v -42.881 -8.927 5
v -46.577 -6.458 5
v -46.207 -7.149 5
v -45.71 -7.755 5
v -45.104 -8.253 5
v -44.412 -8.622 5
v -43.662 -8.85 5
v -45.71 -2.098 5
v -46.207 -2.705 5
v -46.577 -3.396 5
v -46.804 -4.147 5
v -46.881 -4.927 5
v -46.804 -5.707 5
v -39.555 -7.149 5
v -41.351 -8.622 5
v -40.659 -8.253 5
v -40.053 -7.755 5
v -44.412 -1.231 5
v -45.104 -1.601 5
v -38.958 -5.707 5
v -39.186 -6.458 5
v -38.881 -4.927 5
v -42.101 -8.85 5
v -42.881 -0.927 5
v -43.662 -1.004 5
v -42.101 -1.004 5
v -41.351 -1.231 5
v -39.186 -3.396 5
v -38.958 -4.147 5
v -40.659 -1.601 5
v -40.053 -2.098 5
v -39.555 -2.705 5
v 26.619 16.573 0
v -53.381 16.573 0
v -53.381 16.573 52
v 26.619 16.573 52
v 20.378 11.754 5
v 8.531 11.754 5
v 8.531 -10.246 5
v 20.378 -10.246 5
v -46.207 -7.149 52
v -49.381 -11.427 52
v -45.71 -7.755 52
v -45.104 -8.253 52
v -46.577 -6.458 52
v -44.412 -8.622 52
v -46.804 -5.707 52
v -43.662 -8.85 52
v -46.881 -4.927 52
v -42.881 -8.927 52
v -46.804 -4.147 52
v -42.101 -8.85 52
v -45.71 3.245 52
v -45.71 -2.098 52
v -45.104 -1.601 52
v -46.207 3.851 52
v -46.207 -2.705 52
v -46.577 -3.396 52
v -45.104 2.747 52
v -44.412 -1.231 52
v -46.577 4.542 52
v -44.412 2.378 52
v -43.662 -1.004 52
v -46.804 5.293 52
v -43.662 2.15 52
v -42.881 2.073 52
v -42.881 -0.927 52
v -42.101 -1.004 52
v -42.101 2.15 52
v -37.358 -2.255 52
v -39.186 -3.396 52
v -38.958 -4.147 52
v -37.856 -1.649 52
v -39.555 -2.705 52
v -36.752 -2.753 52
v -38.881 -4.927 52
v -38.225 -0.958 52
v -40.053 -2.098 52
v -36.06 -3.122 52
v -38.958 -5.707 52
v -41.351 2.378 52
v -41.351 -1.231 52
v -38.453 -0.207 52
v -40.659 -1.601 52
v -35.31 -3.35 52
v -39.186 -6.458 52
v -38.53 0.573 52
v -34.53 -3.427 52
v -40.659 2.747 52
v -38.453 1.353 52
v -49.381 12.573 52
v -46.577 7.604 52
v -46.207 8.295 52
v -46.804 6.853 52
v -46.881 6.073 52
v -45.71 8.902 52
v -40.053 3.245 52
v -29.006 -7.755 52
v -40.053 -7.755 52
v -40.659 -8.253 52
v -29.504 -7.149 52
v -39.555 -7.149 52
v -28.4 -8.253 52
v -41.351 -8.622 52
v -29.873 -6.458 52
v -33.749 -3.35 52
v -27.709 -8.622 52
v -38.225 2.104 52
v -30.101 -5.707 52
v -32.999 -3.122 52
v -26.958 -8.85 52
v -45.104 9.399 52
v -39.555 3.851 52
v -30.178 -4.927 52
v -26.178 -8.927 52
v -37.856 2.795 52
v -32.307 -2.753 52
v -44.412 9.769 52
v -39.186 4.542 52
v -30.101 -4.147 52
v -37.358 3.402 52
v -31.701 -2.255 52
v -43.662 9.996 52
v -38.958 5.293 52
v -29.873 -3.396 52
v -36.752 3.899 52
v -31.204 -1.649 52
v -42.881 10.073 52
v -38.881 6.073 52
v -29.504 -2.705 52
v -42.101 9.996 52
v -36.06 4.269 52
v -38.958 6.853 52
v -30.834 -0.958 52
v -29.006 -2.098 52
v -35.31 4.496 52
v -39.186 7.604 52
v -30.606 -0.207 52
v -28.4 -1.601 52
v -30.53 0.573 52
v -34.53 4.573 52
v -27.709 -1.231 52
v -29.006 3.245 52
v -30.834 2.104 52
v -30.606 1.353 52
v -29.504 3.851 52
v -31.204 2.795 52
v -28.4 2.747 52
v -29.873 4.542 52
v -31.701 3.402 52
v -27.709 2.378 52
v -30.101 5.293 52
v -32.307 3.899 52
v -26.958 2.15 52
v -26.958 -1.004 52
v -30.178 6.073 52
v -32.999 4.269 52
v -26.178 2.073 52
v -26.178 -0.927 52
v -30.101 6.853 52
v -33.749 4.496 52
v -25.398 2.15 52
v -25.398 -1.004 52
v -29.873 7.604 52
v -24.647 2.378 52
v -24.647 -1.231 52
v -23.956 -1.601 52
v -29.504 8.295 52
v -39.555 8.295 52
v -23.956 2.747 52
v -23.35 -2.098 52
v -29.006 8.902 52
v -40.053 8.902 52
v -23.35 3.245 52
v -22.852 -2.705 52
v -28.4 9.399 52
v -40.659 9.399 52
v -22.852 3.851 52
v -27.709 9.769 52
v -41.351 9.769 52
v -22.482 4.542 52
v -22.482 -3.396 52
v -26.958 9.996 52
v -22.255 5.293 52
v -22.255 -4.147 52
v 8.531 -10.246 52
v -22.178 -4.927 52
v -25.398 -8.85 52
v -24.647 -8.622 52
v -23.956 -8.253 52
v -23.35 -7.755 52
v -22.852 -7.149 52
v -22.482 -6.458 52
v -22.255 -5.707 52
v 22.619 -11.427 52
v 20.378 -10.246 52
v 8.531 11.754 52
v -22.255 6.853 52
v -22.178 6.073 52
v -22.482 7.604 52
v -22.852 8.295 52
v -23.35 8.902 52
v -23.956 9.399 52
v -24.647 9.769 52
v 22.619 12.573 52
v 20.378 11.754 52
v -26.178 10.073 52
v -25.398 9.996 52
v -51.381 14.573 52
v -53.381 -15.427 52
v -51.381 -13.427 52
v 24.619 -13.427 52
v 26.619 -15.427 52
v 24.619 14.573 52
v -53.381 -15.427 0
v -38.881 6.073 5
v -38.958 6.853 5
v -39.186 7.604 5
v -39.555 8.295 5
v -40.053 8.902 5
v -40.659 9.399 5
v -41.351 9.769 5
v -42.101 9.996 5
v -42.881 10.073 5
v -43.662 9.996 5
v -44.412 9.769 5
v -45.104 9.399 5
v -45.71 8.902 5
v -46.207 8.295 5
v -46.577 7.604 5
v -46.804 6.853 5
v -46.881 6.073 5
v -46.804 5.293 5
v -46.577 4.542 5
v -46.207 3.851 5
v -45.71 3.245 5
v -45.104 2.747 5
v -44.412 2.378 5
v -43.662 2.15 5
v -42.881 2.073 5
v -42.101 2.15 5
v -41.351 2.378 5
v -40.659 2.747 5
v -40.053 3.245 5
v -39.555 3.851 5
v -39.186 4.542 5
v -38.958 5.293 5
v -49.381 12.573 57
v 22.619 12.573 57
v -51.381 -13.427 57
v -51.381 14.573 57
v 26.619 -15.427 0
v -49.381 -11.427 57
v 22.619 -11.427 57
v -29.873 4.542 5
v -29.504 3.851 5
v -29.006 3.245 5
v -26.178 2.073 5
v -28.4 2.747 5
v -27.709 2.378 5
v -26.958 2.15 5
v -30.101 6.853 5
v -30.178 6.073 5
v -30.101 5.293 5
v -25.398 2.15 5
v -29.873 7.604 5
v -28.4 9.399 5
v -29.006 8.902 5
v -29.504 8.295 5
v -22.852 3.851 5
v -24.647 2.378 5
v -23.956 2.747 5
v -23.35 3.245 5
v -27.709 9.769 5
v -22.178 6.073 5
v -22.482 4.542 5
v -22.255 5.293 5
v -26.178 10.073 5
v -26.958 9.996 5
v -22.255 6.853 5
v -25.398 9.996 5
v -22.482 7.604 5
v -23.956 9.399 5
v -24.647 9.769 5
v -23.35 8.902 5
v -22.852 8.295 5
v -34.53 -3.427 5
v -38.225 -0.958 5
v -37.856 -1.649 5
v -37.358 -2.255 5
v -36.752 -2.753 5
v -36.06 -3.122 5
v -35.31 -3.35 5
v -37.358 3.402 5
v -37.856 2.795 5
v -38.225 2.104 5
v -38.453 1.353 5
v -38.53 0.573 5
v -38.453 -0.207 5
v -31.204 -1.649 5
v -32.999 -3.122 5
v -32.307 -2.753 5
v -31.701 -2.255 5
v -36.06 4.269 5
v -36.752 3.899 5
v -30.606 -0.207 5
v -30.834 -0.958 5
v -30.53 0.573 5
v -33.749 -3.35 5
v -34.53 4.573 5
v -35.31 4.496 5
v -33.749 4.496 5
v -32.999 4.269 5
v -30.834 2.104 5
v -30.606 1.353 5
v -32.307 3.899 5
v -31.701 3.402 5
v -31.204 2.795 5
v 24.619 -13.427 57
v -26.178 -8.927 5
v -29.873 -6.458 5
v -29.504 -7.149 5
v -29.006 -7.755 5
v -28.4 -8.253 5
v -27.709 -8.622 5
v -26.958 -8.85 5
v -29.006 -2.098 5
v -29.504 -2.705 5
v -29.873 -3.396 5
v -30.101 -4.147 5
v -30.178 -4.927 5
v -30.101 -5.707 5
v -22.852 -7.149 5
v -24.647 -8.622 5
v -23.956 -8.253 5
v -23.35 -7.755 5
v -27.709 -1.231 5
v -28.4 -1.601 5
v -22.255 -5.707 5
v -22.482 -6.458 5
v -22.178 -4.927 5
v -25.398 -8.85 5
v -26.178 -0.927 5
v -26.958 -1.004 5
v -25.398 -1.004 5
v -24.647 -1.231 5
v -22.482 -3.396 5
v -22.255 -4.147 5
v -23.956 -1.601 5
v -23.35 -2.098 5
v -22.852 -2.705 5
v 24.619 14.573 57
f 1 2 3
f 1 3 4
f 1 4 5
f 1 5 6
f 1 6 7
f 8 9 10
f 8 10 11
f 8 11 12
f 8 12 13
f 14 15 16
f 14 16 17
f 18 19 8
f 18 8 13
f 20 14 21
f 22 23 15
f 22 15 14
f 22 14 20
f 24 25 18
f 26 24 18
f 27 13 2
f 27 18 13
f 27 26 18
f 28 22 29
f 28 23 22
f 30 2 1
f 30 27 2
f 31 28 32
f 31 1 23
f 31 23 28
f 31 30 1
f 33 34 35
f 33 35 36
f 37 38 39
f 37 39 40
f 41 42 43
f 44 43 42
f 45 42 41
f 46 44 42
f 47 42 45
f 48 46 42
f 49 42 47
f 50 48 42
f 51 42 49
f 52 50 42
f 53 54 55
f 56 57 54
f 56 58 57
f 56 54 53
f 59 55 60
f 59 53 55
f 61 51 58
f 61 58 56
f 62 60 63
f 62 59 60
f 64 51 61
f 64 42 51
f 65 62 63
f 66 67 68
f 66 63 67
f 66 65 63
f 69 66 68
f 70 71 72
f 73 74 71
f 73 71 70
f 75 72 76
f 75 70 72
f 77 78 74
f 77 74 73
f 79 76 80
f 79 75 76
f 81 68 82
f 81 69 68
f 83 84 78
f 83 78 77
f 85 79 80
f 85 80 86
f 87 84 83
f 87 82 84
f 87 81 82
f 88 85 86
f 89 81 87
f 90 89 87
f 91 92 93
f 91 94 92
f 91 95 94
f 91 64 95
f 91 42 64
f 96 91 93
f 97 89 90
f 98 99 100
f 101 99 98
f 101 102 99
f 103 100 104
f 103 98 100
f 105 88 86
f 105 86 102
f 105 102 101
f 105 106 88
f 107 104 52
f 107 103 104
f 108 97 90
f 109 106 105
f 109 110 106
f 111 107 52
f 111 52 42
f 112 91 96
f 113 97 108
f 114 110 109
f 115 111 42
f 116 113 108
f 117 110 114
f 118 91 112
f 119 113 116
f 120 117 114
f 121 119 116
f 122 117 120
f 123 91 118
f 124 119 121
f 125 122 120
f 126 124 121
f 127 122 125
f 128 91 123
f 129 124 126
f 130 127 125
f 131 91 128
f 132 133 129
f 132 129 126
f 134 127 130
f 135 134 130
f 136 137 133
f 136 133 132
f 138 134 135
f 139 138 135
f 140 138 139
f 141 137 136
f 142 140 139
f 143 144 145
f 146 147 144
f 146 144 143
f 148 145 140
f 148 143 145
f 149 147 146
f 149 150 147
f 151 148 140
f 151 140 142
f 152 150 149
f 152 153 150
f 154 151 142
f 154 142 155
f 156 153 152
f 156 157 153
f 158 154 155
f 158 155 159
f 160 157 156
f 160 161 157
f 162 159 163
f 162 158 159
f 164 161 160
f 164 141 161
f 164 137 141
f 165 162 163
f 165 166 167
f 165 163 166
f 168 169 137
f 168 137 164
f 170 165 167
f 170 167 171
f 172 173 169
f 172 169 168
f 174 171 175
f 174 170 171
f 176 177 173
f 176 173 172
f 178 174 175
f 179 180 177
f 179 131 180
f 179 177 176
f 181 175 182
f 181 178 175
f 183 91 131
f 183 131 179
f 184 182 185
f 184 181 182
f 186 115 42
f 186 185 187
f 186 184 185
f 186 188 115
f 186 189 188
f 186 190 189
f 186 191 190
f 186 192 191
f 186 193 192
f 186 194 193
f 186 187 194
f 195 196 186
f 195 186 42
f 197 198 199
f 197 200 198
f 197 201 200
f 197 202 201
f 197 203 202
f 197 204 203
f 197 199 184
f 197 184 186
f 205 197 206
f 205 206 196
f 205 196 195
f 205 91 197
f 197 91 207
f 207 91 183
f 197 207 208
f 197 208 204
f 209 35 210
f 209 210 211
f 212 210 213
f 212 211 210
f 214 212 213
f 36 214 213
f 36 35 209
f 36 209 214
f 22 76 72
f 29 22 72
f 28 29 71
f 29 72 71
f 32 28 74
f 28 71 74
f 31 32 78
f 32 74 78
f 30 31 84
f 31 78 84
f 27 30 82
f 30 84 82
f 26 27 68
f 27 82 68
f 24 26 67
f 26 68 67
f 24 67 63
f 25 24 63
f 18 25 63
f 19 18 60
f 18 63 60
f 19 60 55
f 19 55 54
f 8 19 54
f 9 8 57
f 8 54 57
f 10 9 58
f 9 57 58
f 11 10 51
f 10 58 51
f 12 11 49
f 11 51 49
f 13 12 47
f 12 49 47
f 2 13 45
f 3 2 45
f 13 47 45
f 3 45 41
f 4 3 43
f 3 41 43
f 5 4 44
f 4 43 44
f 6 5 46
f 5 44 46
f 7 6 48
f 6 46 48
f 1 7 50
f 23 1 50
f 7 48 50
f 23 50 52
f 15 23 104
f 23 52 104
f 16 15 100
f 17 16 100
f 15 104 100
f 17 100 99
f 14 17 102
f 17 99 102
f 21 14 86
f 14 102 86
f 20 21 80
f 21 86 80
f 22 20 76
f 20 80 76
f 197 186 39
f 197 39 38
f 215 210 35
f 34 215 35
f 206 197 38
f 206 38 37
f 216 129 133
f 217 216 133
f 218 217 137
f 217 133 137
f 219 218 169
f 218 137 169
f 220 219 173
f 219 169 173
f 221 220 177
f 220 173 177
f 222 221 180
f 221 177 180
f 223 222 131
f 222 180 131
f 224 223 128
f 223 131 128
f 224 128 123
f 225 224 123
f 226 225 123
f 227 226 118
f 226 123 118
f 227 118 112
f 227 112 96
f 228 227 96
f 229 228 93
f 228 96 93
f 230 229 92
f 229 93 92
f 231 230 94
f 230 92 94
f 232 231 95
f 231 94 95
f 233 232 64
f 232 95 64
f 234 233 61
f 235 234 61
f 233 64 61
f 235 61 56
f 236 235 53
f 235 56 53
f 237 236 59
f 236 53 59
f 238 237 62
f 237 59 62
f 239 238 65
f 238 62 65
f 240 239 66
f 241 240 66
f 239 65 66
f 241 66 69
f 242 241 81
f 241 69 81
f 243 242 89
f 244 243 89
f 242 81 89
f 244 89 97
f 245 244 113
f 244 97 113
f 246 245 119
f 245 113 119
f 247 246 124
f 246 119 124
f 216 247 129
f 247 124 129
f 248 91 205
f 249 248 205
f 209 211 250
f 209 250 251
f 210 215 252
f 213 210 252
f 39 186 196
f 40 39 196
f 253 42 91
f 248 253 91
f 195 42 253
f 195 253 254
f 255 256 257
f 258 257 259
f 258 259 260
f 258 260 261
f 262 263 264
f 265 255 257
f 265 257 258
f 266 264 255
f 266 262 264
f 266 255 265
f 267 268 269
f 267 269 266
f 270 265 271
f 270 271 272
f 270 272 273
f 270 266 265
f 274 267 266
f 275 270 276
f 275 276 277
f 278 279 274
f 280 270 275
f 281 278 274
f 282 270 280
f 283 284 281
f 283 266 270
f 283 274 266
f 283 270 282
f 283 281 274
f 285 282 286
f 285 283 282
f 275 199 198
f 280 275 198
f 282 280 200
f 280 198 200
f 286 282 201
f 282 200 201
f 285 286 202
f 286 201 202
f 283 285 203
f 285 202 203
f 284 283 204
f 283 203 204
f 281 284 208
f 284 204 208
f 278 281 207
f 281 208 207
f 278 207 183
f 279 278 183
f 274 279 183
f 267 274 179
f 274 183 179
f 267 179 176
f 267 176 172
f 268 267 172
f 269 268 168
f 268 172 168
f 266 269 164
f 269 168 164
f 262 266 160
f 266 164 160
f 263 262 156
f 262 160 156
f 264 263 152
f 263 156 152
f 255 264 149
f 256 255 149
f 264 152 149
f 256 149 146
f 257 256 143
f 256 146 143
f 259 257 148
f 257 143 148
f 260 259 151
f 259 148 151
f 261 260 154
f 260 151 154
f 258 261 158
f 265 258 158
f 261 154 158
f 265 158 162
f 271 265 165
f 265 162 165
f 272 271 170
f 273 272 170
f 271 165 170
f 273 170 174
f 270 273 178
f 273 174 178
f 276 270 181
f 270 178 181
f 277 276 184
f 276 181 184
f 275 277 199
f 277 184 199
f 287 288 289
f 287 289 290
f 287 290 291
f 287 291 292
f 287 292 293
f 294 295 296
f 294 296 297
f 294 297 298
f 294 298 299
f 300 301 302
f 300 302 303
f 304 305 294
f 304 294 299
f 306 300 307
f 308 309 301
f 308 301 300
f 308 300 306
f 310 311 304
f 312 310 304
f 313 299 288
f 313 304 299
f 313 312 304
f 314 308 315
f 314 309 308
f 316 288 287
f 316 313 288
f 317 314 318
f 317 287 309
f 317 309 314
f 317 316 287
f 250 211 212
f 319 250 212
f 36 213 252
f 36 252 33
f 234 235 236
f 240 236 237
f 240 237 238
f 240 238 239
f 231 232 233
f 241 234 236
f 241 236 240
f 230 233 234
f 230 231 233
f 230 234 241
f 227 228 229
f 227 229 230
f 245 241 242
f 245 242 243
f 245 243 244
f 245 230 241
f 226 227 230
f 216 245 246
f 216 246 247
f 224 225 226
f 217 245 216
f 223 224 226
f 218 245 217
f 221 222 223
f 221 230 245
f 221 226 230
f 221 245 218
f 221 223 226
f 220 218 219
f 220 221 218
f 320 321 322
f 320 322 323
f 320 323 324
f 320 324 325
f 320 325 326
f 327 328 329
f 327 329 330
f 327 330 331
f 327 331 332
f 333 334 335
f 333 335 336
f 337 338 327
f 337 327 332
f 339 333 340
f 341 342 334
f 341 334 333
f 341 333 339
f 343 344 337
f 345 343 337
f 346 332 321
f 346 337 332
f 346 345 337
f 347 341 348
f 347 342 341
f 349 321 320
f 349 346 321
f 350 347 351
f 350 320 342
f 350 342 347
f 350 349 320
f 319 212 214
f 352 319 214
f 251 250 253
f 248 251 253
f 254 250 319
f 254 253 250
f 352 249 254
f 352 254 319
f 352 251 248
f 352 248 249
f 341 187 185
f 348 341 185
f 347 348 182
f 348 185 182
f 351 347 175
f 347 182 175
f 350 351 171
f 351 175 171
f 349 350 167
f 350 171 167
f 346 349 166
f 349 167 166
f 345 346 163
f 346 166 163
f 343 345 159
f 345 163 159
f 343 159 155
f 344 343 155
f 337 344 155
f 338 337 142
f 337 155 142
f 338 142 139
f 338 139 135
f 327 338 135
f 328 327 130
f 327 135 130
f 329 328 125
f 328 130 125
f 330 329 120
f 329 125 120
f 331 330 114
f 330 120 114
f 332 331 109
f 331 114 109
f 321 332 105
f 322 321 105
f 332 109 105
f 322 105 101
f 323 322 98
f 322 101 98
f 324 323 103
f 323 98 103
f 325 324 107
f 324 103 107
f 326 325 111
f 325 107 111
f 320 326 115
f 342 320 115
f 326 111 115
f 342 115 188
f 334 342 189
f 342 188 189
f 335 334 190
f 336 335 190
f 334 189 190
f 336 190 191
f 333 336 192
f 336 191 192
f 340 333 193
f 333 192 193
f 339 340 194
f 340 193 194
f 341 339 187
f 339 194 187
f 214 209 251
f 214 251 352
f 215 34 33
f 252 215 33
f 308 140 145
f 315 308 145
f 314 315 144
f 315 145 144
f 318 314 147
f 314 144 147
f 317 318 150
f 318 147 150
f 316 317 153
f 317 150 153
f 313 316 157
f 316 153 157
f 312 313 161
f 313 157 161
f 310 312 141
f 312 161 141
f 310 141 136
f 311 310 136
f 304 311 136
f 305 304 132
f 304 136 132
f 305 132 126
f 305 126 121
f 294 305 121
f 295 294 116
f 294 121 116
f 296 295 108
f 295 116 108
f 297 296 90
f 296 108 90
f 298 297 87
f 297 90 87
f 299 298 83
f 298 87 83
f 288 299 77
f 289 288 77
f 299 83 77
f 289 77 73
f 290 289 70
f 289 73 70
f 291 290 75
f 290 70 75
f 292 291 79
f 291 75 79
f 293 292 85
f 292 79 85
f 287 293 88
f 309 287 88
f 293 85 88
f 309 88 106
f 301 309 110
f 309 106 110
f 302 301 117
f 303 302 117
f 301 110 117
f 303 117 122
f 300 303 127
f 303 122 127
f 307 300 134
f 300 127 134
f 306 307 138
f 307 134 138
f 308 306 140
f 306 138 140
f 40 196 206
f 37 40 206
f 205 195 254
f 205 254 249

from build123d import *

# Parameters (mm, degrees)
F0_W     = 80
F0_H     = 32
F0_W_2   = 76
F0_H_2   = 28
F1_DEPTH = 52
F0_W_3   = 72
F0_H_3   = 24
F2_DEPTH = 57
F3_DEPTH = 52
F4_R     = 4
F4_W     = 11.847522
F4_H     = 22
F5_DEPTH = 47


with BuildPart() as f1:
    # F0 (on Top) → F1 (new body)
    with BuildSketch(Plane.XY):
        with Locations((-13.381271, 0.573133)):
            Rectangle(F0_W, F0_H)
        with Locations((-13.381271, 0.573133)):
            Rectangle(F0_W_2, F0_H_2, mode=Mode.SUBTRACT)
    extrude(amount=F1_DEPTH)

    # F0 (on Top) → F2 (join)
    with BuildSketch(Plane.XY):
        with Locations((-13.381271, 0.573133)):
            Rectangle(F0_W_2, F0_H_2)
        with Locations((-13.381271, 0.573133)):
            Rectangle(F0_W_3, F0_H_3, mode=Mode.SUBTRACT)
    extrude(amount=F2_DEPTH)

    # F0 (on Top) → F3 (join)
    with BuildSketch(Plane.XY):
        with Locations((-13.381271, 0.573133)):
            Rectangle(F0_W_3, F0_H_3)
    extrude(amount=F3_DEPTH)

    # F4 (on face) → F5 (cut)
    with BuildSketch(Plane.XY.offset(52)):
        with Locations((-42.881271, -4.926867)):
            Circle(F4_R)
        with Locations((-34.529625, 0.573133)):
            Circle(F4_R)
        with Locations((-26.177978, -4.926867)):
            Circle(F4_R)
        with Locations((-26.177978, 6.073133)):
            Circle(F4_R)
        with Locations((-42.881271, 6.073133)):
            Circle(F4_R)
        with Locations((14.454672, 0.753674)):
            Rectangle(F4_W, F4_H)
    extrude(amount=-F5_DEPTH, mode=Mode.SUBTRACT)


solid = f1.part
